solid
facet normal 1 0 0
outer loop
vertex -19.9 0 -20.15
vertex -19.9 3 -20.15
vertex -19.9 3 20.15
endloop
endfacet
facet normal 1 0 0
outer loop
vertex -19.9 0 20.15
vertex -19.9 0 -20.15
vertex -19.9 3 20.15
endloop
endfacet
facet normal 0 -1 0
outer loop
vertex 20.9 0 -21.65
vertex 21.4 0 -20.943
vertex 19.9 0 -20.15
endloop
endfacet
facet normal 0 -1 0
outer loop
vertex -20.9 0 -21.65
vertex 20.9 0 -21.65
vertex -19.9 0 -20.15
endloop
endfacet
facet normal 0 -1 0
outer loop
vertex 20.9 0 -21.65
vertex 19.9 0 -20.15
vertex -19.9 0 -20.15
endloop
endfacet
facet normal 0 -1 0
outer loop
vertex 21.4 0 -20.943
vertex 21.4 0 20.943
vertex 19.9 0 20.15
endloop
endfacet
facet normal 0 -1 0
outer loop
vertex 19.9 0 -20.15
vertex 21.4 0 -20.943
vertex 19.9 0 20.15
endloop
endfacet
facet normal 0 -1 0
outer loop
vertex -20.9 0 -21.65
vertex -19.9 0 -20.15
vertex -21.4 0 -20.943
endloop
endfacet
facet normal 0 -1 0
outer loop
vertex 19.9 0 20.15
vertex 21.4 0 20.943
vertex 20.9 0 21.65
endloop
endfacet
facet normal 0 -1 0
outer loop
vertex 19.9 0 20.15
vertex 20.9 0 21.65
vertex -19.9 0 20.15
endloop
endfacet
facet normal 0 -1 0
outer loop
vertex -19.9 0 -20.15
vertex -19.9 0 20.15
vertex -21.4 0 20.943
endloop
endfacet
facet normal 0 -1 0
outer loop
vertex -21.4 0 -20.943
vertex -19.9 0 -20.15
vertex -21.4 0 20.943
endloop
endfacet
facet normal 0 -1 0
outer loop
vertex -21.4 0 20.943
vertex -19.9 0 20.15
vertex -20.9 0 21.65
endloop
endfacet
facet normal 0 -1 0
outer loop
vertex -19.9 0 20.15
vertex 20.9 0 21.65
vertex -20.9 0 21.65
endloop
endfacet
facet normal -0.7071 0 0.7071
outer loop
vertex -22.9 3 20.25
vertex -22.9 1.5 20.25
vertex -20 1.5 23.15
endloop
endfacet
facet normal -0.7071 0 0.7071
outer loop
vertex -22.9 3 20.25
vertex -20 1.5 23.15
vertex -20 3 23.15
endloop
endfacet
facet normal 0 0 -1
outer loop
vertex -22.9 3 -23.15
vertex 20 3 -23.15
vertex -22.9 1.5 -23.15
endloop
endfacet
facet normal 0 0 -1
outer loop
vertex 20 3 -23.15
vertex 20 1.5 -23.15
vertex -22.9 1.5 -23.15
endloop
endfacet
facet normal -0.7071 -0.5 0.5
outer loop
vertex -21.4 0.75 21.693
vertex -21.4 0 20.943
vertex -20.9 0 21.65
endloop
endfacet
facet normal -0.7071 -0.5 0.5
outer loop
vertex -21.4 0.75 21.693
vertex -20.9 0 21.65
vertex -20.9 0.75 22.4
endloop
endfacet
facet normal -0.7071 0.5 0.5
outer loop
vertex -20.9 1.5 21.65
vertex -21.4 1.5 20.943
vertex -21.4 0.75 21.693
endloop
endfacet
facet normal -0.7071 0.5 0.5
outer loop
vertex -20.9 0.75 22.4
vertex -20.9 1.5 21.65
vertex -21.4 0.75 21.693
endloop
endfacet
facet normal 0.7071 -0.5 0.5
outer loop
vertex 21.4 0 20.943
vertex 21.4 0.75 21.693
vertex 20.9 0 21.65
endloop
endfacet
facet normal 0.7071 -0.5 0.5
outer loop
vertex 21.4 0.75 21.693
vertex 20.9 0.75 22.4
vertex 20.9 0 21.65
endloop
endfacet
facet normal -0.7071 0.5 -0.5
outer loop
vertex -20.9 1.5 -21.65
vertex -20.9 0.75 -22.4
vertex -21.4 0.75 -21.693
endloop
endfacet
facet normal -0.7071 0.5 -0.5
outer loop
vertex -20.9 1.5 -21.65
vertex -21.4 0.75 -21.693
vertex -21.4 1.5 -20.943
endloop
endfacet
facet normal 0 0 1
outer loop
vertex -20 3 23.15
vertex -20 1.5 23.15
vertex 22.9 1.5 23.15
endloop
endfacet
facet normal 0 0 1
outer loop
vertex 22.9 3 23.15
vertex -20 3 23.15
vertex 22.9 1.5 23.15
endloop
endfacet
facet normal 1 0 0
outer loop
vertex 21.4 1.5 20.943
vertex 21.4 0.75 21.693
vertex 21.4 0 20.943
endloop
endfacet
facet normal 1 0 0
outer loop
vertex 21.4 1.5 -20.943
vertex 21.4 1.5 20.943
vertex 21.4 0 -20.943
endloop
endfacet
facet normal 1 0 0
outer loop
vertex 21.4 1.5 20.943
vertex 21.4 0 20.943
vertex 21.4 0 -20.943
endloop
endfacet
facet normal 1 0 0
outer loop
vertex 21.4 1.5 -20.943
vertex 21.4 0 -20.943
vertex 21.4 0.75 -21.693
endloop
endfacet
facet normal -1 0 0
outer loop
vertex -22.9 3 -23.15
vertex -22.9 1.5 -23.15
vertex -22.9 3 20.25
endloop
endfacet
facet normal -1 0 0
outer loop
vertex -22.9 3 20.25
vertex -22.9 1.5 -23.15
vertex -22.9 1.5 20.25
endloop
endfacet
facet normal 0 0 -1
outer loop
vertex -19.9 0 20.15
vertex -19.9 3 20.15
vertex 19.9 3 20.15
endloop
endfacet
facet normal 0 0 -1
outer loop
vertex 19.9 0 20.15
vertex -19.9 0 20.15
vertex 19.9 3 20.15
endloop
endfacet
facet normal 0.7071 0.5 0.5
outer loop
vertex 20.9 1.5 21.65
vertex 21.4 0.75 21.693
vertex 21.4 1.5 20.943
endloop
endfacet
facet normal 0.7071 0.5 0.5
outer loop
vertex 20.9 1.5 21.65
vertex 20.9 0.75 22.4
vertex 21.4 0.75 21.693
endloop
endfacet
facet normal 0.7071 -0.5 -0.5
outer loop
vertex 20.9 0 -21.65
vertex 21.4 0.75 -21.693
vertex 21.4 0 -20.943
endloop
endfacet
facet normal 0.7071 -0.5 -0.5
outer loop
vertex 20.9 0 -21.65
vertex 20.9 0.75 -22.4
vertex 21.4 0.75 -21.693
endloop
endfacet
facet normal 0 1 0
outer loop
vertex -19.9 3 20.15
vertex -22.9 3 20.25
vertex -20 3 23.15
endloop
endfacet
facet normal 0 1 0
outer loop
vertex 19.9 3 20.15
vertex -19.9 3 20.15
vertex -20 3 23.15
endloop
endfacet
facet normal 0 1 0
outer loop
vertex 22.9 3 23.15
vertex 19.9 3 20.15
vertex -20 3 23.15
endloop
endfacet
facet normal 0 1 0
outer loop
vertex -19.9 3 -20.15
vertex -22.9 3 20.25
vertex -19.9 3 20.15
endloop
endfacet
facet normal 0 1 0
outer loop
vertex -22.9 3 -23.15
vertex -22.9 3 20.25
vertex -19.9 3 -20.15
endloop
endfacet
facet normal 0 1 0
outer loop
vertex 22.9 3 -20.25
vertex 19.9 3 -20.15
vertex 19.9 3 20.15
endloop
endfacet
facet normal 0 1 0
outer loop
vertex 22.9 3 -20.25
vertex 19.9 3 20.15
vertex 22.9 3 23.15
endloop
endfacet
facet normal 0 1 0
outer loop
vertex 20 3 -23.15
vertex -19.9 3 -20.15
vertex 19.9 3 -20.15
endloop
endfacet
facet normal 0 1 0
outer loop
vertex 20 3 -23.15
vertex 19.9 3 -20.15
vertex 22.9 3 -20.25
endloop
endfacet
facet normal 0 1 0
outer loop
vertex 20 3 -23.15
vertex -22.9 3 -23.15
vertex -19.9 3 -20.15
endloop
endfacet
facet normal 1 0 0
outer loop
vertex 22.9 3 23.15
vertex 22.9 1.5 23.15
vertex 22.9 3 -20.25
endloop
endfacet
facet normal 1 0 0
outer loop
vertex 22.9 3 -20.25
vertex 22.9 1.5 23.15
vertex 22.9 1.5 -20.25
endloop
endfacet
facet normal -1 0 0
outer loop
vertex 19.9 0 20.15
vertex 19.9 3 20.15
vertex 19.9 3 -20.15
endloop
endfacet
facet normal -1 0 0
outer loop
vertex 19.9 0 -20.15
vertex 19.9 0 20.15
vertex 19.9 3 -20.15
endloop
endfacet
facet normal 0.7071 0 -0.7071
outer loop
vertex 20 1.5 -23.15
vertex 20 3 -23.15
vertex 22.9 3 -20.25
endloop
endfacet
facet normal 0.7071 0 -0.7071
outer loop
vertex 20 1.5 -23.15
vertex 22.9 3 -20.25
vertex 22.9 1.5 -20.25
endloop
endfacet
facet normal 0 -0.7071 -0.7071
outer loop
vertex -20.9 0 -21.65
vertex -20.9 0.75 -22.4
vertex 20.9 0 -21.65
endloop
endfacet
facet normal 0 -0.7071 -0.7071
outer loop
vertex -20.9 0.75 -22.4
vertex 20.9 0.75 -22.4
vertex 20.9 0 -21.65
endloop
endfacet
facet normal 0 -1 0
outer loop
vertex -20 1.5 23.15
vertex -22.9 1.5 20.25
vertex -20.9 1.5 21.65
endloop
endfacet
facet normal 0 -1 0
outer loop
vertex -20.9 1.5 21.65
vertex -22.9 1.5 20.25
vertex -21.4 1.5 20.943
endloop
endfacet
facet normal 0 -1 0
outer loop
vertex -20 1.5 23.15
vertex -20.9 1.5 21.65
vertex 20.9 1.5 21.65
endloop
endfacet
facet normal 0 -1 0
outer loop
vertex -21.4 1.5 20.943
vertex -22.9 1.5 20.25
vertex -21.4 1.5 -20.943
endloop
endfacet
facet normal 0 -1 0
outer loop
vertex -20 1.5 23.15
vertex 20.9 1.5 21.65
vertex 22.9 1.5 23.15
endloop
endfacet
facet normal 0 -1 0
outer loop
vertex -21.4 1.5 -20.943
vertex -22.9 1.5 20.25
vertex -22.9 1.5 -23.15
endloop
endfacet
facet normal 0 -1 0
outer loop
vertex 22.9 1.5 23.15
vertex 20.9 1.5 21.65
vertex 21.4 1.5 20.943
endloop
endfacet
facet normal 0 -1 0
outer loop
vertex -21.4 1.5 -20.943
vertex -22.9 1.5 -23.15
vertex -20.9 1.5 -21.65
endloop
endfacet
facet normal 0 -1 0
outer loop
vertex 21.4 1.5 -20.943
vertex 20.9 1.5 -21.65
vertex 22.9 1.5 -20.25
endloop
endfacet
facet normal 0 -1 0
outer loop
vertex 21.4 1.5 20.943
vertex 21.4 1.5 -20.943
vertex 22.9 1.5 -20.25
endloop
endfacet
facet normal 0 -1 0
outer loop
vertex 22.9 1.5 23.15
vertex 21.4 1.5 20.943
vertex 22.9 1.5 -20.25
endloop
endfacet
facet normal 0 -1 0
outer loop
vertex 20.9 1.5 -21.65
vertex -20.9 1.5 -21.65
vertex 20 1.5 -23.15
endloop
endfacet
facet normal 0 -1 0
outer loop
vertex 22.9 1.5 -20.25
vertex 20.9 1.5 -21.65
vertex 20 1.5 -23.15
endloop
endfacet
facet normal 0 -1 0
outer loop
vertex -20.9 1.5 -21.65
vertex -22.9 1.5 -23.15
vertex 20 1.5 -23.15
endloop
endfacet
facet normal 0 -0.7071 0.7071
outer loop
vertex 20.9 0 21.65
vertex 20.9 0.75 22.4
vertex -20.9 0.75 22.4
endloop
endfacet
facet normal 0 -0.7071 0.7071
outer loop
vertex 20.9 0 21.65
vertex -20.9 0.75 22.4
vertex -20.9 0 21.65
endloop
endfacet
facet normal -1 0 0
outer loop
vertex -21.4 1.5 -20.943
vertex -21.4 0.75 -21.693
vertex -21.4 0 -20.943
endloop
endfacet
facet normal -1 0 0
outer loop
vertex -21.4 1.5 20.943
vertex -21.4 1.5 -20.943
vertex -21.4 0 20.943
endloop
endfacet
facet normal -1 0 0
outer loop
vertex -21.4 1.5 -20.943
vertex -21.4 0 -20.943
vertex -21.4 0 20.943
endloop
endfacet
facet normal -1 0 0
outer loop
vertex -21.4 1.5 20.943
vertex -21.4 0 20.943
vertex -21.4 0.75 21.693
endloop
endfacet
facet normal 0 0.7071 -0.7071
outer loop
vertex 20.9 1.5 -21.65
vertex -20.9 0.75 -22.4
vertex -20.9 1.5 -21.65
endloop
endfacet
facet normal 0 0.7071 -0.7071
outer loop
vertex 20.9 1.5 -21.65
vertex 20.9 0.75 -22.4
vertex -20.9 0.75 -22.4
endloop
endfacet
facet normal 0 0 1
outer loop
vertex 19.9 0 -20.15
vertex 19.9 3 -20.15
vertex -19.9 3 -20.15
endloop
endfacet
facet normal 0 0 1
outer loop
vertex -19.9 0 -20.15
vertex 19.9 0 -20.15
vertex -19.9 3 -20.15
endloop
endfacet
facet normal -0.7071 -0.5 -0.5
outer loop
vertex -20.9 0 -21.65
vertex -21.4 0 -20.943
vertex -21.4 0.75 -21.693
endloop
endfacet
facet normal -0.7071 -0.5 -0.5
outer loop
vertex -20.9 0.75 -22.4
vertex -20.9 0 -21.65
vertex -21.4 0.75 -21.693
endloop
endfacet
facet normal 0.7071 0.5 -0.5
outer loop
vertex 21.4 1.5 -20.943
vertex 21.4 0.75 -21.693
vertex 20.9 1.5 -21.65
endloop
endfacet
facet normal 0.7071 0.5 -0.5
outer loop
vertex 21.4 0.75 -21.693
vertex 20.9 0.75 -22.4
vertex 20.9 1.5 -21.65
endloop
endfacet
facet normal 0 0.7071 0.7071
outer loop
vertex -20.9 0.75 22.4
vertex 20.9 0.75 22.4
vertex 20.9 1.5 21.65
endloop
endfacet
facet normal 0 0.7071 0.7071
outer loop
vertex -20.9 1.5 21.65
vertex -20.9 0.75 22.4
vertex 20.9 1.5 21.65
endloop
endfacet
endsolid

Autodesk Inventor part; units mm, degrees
ref_plane "YZ Plane" through (0, 0, 0) normal (1, 0, 0) x (0, 1, 0)
ref_plane "XZ Plane" through (0, 0, 0) normal (0, 1, 0) x (-1, 0, 0)
ref_plane "XY Plane" through (0, 0, 0) normal (0, 0, 1) x (1, 0, 0)
sketch "Sketch1" plane through (0, 0, 0) normal (0, 1, 0) x (-1, 0, 0)
  line L0 (-21.4, -21.65) -> (21.4, -21.65)
  line L1 (21.4, -21.65) -> (21.4, 21.65)
  line L2 (21.4, 21.65) -> (-21.4, 21.65)
  line L3 (-21.4, 21.65) -> (-21.4, -21.65)
  line L4 (-21.4, -21.65) -> (21.4, 21.65) construction
  line L5 (21.4, -21.65) -> (-21.4, 21.65) construction
  point P0 (0, 0)
  dimension "d0" = 43.3
  dimension "d1" = 42.8
extrude "Extrusion1" add sketch "Sketch1" along normal blind 1.5
sketch "Sketch2" plane through (0, 1.5, 0) normal (0, 1, 0) x (1, 0, 0)
  line L0 (22.9, 23.15) -> (-22.9, 23.15)
  line L1 (-22.9, 23.15) -> (-22.9, -23.15)
  line L2 (-22.9, -23.15) -> (22.9, -23.15)
  line L3 (22.9, -23.15) -> (22.9, 23.15)
  line L4 (22.9, 23.15) -> (-22.9, -23.15) construction
  line L5 (-22.9, 23.15) -> (22.9, -23.15) construction
  line L6 (-21.4, 21.65) -> (-21.4, -21.65) projected
  line L7 (-21.4, -21.65) -> (21.4, -21.65) projected
  point P0 (0, 0)
  dimension "d4" = 1.5
  dimension "d5" = 1.5
extrude "Extrusion2" add sketch "Sketch2" along normal blind 1.5
sketch "Sketch3" plane through (0, 3, 0) normal (0, 1, 0) x (1, 0, 0)
  line L0 (19.9, 20.15) -> (-19.9, 20.15)
  line L1 (-19.9, 20.15) -> (-19.9, -20.15)
  line L2 (-19.9, -20.15) -> (19.9, -20.15)
  line L3 (19.9, -20.15) -> (19.9, 20.15)
  line L4 (19.9, 20.15) -> (-19.9, -20.15) construction
  line L5 (-19.9, 20.15) -> (19.9, -20.15) construction
  line L6 (-21.4, -21.65) -> (21.4, -21.65) projected
  line L7 (-21.4, 21.65) -> (-21.4, -21.65) projected
  point P0 (0, 0)
  dimension "d8" = 1.5
  dimension "d9" = 1.5
extrude "Extrusion3" cut sketch "Sketch3" against normal through all
chamfer "Chamfer1" distance 2.9 angle 45 2 edges at (22.9, 2.25, -23.15) (-22.9, 2.25, 23.15)
sketch "Sketch4" plane through (21.4, 0, 21.65) normal (1, 0, 0) x (0, 0, -1)
  line L0 (1.4, 1.5) -> (-1.5, 1.5) projected
  line L1 (-0.75, 1.5) -> (44.05, 1.5)
  line L2 (44.05, 1.5) -> (44.05, 0)
  line L3 (44.05, 0) -> (-0.75, 0)
  line L4 (-0.75, 0) -> (-0.75, 1.5)
  line L5 (0, 0) -> (43.3, 0) projected
  line L6 (-0.75, 0.75) -> (0, 0)
  line L7 (-0.75, 0.75) -> (0, 1.5)
  line L8 (21.65, 9.7528) -> (21.65, -18.8519)
  line L9 (0, 0) -> (0, 1.5) projected
  line L10 (44.05, 0.75) -> (43.3, 0)
  line L11 (44.05, 0.75) -> (43.3, 1.5)
  line L12 (43.3, 0) -> (43.3, 1.5)
  point P0 (21.65, 0)
  point P1 (21.65, 0)
  point P2 (21.65, 0)
  dimension "d16" = 44.8
  dimension "d17" = 22.4
  dimension "d18" = 0.75
extrude "Extrusion4" add sketch "Sketch4" against normal up to surface (42.8 mm away) contours L9 L6 L7 | L11 L10 L12
chamfer "Chamfer2" distance 0.5 angle 45 8 edges at (-21.4, 0.375, -22.025) (-21.4, 1.125, -22.025) (-21.4, 0.375, 22.025) (-21.4, 1.125, 22.025) (21.4, 0.375, 22.025) (21.4, 1.125, 22.025) (21.4, 0.375, -22.025) (21.4, 1.125, -22.025)
equation "\"d17\" = 0.5 * d16"
properties part number "Installation Tool Collar"
